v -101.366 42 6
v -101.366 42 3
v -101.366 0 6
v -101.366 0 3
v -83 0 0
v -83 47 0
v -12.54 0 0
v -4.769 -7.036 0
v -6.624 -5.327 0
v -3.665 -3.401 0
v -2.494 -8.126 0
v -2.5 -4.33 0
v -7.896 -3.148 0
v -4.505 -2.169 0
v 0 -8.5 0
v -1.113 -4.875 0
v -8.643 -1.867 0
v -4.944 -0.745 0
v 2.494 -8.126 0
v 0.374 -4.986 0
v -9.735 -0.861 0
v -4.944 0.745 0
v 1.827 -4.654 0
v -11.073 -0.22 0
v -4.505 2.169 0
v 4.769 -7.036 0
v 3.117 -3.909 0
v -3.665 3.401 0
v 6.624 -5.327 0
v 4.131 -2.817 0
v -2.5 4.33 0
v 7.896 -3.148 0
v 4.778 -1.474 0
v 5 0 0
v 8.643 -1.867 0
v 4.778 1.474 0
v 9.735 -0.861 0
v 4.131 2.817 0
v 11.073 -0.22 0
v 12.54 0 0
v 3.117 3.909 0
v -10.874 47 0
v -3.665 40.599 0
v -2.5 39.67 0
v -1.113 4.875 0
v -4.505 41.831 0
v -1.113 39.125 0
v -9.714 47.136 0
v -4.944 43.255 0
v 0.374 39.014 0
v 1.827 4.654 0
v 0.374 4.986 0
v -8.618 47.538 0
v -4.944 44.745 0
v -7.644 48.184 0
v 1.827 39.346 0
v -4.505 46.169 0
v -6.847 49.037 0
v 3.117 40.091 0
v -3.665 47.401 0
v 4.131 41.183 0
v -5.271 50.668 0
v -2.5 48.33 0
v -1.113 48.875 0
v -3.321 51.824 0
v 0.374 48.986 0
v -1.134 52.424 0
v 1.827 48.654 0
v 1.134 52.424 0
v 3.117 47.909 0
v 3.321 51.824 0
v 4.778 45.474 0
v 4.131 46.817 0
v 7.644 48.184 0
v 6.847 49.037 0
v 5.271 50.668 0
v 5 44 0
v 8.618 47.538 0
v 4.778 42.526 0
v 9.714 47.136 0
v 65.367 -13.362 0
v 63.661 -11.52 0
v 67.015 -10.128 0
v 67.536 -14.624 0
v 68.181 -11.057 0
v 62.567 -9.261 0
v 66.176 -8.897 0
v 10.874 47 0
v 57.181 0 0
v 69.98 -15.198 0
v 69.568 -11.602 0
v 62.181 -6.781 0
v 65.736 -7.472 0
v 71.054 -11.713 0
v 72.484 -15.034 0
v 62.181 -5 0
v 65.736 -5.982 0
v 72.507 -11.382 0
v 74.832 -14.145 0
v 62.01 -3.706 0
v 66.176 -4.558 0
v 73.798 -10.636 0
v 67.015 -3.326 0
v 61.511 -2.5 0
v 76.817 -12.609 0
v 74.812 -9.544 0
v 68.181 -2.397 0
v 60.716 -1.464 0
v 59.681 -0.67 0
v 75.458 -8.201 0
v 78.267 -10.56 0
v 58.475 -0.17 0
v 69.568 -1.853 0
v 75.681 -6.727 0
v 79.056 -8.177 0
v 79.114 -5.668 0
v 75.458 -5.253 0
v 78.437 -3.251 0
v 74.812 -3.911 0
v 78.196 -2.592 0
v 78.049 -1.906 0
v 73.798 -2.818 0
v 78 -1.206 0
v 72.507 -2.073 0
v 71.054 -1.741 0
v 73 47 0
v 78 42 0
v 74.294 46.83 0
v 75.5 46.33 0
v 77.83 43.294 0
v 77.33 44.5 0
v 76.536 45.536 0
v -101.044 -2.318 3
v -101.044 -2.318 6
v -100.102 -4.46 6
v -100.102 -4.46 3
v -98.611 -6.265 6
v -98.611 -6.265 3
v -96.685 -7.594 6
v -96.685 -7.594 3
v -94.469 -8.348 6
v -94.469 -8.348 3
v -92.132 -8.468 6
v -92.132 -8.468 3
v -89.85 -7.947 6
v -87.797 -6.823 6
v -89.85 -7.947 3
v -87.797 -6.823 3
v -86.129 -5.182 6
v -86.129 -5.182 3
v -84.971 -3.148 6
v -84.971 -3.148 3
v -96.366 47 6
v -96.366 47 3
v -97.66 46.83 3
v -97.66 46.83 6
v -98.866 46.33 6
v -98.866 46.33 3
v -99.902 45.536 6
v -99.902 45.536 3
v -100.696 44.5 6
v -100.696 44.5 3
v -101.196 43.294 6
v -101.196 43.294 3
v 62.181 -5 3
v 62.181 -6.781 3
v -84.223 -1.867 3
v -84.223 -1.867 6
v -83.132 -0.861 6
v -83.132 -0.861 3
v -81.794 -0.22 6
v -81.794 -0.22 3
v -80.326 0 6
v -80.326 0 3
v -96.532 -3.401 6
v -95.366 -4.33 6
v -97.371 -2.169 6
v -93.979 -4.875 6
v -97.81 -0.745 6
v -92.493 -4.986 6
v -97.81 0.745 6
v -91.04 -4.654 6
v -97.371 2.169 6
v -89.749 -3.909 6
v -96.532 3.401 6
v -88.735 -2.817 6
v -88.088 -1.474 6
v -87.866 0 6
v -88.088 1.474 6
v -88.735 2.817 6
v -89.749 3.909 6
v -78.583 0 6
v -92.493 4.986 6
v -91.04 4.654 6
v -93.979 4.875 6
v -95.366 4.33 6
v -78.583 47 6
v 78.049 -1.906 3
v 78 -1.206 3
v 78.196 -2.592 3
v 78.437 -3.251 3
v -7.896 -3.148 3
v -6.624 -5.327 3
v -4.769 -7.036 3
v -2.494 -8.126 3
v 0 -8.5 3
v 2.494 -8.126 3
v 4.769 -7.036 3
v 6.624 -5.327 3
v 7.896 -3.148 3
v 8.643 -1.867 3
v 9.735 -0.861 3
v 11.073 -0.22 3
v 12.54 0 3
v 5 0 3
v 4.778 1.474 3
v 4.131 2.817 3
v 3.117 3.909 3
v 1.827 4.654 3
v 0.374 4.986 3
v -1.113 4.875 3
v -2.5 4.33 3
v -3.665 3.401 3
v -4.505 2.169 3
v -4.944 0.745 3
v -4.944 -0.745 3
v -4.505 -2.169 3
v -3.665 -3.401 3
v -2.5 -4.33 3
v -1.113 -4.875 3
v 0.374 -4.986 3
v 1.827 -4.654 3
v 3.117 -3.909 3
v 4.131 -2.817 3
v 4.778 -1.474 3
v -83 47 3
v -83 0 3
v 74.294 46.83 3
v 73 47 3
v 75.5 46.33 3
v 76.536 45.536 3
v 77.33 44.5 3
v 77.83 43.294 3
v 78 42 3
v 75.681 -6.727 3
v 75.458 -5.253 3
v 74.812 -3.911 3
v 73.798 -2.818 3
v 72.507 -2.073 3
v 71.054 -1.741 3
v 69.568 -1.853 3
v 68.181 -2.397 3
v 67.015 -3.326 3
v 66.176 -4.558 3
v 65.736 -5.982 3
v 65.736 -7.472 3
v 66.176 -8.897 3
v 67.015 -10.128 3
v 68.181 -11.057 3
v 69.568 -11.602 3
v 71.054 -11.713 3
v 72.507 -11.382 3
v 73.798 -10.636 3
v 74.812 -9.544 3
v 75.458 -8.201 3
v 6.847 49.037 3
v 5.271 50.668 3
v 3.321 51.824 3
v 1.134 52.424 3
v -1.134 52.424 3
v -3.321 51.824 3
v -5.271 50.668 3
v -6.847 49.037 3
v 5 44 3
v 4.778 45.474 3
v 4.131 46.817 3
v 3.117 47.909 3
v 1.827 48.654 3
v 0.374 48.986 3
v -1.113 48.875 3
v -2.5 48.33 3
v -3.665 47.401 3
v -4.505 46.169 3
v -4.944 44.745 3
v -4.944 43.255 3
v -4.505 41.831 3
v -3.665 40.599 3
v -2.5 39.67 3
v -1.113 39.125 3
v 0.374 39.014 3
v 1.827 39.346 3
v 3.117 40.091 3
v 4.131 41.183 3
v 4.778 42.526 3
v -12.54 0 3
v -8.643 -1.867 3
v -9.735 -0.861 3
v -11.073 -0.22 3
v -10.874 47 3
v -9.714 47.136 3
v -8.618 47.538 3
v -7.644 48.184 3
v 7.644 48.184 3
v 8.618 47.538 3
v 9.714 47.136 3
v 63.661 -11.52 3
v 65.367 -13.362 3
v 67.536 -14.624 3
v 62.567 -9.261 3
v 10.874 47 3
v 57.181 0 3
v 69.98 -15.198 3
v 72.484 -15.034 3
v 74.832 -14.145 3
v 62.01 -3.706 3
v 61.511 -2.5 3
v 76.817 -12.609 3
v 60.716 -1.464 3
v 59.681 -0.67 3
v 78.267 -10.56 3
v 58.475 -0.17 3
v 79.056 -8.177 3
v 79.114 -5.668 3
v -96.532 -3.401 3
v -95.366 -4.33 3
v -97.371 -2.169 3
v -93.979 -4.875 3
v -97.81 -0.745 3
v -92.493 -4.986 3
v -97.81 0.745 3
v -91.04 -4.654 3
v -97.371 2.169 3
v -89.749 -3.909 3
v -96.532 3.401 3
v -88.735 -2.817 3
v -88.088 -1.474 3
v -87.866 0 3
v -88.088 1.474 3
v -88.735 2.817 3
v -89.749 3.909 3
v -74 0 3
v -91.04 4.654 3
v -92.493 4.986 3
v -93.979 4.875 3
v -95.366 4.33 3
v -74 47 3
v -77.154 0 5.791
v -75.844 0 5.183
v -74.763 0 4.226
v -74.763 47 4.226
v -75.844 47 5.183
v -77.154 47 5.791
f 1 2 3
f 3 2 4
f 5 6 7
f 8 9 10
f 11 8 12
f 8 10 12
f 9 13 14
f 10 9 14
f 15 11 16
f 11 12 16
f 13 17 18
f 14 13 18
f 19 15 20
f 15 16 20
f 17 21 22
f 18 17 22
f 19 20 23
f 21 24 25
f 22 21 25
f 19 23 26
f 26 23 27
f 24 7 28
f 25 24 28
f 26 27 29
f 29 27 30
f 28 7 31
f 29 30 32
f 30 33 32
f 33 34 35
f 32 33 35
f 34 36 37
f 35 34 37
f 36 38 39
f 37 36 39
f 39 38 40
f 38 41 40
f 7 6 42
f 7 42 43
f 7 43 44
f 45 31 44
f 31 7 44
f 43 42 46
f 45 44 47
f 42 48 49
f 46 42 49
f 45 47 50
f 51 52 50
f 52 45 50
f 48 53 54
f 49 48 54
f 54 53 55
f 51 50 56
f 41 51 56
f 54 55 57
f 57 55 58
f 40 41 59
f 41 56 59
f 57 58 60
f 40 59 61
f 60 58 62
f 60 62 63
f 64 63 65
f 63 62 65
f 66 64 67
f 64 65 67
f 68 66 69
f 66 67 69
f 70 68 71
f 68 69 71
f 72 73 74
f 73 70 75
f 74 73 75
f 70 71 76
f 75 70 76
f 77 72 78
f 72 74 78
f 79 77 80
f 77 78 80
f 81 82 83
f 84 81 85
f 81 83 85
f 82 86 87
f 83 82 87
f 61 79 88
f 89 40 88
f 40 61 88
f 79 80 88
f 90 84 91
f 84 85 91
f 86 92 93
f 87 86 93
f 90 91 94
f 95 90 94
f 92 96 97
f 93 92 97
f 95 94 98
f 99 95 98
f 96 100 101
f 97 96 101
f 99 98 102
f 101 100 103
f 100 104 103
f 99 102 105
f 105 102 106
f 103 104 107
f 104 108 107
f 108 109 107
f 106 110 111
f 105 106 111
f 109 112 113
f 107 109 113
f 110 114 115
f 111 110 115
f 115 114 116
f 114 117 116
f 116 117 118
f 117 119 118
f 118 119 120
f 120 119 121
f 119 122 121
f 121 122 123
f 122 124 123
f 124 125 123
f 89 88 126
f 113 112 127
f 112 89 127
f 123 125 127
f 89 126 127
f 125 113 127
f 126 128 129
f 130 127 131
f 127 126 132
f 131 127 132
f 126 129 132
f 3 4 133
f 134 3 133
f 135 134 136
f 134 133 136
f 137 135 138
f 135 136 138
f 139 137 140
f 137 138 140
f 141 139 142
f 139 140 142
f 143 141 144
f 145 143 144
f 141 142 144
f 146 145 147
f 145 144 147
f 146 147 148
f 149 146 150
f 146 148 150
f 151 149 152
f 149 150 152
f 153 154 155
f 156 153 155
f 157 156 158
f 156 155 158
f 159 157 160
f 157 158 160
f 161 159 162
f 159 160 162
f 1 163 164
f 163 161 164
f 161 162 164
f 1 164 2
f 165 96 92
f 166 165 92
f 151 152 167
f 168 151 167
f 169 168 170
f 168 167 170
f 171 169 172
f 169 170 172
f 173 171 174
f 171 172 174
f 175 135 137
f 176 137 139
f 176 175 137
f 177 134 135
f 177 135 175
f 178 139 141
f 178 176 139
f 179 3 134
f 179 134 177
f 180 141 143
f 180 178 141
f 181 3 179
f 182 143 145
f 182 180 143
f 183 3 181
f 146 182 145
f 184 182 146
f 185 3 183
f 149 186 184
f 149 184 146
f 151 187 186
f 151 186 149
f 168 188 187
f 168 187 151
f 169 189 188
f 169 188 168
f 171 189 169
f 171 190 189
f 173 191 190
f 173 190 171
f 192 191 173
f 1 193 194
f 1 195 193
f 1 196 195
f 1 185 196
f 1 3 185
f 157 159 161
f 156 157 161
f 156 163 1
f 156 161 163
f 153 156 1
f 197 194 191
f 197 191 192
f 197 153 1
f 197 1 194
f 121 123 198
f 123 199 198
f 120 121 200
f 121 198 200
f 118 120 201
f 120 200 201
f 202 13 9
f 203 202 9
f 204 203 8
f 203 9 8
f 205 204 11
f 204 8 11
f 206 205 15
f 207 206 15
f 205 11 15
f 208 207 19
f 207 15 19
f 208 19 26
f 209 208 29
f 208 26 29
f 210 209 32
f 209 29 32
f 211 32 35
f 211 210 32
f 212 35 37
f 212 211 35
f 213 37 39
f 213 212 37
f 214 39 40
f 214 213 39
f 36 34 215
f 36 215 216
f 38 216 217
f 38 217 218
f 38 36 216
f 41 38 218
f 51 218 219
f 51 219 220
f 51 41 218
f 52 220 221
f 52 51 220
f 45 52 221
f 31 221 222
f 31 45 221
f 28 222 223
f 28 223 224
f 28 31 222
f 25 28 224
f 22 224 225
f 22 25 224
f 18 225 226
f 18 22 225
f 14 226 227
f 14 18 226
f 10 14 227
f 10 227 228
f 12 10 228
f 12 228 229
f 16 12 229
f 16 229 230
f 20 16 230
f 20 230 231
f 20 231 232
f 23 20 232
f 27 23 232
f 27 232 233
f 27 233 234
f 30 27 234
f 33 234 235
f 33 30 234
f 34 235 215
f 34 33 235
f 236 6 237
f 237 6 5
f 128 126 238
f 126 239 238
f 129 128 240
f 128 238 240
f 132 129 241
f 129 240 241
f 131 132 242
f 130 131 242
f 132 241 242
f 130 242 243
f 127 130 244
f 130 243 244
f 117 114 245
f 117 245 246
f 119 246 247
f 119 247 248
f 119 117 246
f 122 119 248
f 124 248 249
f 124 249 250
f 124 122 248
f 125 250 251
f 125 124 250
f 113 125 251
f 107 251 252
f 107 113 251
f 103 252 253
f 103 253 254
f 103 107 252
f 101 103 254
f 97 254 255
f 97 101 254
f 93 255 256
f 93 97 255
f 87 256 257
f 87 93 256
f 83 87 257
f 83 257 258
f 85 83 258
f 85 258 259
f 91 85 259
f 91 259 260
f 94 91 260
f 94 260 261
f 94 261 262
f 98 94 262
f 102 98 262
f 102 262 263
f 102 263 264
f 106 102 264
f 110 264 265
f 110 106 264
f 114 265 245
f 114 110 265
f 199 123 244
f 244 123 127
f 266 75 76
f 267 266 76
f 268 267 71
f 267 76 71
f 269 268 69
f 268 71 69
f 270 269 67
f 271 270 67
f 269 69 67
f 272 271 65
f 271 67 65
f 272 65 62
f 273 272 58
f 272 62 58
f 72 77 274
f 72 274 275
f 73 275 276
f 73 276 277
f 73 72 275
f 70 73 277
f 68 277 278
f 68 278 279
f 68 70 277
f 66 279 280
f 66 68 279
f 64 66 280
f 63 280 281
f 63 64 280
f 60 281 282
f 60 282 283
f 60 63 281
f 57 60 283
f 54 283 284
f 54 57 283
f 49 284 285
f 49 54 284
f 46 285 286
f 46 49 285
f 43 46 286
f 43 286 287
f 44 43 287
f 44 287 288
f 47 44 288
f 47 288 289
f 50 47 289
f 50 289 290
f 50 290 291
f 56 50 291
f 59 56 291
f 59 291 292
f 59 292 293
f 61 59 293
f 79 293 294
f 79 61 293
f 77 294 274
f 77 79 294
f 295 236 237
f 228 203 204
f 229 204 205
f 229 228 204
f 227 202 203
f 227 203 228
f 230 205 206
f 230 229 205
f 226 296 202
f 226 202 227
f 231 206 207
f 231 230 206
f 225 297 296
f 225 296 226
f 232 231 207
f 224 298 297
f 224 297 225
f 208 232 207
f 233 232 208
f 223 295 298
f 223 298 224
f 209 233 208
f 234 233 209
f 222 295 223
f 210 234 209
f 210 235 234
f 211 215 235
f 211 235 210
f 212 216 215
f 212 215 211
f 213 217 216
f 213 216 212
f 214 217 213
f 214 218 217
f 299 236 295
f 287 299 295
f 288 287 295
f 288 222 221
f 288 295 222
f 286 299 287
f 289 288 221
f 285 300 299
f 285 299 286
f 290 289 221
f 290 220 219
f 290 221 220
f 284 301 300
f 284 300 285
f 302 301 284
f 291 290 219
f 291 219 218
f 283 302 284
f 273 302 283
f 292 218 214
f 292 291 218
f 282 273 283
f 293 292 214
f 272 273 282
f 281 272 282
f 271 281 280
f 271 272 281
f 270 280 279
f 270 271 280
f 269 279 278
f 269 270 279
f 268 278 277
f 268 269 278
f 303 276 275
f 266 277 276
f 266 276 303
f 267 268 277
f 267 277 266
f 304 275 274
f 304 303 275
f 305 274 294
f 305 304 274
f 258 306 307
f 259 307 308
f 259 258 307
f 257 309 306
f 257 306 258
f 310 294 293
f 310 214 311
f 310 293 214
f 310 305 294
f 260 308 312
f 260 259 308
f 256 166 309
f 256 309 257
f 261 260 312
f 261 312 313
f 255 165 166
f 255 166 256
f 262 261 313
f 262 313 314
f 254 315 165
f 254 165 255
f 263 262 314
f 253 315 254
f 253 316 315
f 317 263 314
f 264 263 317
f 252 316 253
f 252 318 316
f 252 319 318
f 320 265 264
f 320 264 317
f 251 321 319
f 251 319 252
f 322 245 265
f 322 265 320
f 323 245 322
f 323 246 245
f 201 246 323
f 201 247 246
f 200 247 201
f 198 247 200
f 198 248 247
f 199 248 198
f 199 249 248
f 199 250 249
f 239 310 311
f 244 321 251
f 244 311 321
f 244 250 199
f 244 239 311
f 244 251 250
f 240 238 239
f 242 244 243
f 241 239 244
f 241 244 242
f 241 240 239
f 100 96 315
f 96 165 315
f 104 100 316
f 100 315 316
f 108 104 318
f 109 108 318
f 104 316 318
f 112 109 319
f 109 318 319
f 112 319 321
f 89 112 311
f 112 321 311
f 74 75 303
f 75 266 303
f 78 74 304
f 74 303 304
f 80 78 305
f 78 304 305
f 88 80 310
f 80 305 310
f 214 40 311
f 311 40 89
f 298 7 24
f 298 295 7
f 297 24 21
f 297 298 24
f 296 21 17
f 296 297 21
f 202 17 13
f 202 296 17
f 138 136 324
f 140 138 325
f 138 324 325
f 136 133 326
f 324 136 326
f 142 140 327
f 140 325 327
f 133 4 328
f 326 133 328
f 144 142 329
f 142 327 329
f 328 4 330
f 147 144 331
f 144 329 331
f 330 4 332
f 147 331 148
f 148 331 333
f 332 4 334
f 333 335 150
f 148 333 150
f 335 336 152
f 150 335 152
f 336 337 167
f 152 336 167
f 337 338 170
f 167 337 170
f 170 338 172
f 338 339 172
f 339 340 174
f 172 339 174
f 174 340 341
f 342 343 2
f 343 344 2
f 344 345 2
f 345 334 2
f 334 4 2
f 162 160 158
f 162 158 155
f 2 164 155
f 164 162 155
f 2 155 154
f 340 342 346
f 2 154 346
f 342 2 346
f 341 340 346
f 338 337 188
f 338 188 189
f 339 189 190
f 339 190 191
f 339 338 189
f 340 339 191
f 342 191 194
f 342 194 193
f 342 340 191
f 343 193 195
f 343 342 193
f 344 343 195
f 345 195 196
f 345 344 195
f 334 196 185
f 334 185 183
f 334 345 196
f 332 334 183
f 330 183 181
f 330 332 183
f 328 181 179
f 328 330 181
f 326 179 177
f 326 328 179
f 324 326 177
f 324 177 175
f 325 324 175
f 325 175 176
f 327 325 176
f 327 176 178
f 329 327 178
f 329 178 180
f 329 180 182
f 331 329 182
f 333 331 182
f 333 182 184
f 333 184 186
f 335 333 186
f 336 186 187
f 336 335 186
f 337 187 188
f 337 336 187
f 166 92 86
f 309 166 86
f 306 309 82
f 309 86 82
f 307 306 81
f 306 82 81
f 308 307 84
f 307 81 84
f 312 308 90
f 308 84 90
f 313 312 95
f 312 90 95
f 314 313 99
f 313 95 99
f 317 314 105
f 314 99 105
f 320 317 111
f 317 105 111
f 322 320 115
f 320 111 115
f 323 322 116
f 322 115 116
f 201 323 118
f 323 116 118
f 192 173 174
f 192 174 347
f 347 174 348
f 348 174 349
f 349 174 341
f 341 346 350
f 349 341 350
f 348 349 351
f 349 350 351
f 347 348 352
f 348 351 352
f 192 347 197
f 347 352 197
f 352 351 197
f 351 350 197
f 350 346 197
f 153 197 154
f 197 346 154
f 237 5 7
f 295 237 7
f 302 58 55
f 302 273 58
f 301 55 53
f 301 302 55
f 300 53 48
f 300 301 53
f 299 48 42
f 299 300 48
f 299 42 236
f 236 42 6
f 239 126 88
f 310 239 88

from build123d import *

# Parameters (mm, degrees)
F0_R          = 5
F1_DEPTH      = 3
F2_W          = 9
F2_H          = 47
F2_R          = 5
F3_DEPTH      = 3
F4_F1_R       = 5
F4_F2_R       = 5
F4_2_T1_DEPTH = 3
F4_2_T3_DEPTH = 69.9128784748
F4_2_T5_DEPTH = 28


# Not quite as in the source:
# - a fillet or chamfer that OpenCascade refuses, or shapes differently, is made with other operations: its cross-section is extruded or revolved along the edge and cut away or added


with BuildPart() as f1:
    # F0 (on Top) → F1 (new body)
    with BuildSketch(Plane.XY):
        with BuildLine():
            ThreePointArc((7.9529868603, 47), (0, 52.5), (-7.9529868603, 47))
            Line((-7.9529868603, 47), (-83, 47))
            Line((-83, 47), (-83, 0))
            Line((-83, 0), (-8.5, 0))
            ThreePointArc((-8.5, 0), (0, -8.5), (8.5, 0))
            Line((8.5, 0), (62.1807458666, 0))
            Line((62.1807458666, 0), (62.1807458666, -6.6735107167))
            Line((62.1807458666, -6.6735107167), (62.1807458666, -6.7810347379))
            ThreePointArc((62.1807458666, -6.7810347379), (72.9464615235, -14.9196937423), (78, -2.4056954659))
            Line((78, -2.4056954659), (78, 47))
            Line((78, 47), (7.9529868603, 47))
        make_face()
        Circle(F0_R, mode=Mode.SUBTRACT)
        with Locations((70.6805758441, -6.7272727273)):
            Circle(F0_R, mode=Mode.SUBTRACT)
        with Locations((0, 44)):
            Circle(F0_R, mode=Mode.SUBTRACT)
    extrude(amount=F1_DEPTH)

    # F4: fillet of radius 5 on 7 edges, made by hand

    # F4_f1
    f4_f1_edges = [f1.edges().sort_by_distance(p)[0] for p in [
        (8.5, 0, 1.5),
        (-8.5, 0, 1.5),
        (62.1807458666, 0, 1.5),
        (78, -2.4056954659, 1.5),
        (7.9529868603, 47, 1.5),
        (-7.9529868603, 47, 1.5),
    ]]
    fillet(f4_f1_edges, radius=F4_F1_R)

    # F4_f2
    f4_f2_edges = [f1.edges().sort_by_distance(p)[0] for p in [
        (78, 47, 1.5),
    ]]
    fillet(f4_f2_edges, radius=F4_F2_R)


with BuildPart() as f3:
    # F2 (on face) → F3 (new body)
    with BuildSketch(Plane.XY.offset(3)):
        with Locations((-78.5, 23.5)):
            Rectangle(F2_W, F2_H)
        with BuildLine():
            Line((-84.3662815094, 0), (-83, 0))
            Line((-83, 0), (-83, 47))
            Line((-83, 47), (-101.3662815094, 47))
            Line((-101.3662815094, 47), (-101.3662815094, 0))
            ThreePointArc((-101.3662815094, 0), (-92.8662815094, -8.5), (-84.3662815094, 0))
        make_face()
        with Locations((-92.8662815094, 0)):
            Circle(F2_R, mode=Mode.SUBTRACT)
    extrude(amount=F3_DEPTH)

    # F4#2: fillet of radius 5 on 3 edges, made by hand

    # F4_2_s2 → F4_2_t1 (join)
    with BuildSketch(Plane.XY.offset(3)):
        with BuildLine():
            ThreePointArc((-84.9707661217, -3.1481481481), (-83.1317633438, -0.8612043262), (-80.3263453054, 0))
            Line((-80.3263453054, 0), (-84.3662815094, 0))
            ThreePointArc((-84.3662815094, 0), (-84.5187704793, -1.6028286254), (-84.9707661217, -3.1481481481))
        make_face()
    extrude(amount=F4_2_T1_DEPTH)

    # F4_2_s4 → F4_2_t3 (cut)
    with BuildSketch(Plane.XZ.offset(-58.4564392374)):
        with BuildLine():
            ThreePointArc((-74, 3), (-75.8439629074, 5.1833001327), (-78.582575695, 6))
            Line((-78.582575695, 6), (-74, 6))
            Line((-74, 6), (-74, 3))
        make_face()
    extrude(amount=F4_2_T3_DEPTH, mode=Mode.SUBTRACT)

    # F4_2_s6 → F4_2_t5 (cut)
    with BuildSketch(Plane.XY.offset(-9.5)):
        with BuildLine():
            ThreePointArc((-96.3662815094, 47), (-99.9018154153, 45.5355339059), (-101.3662815094, 42))
            Line((-101.3662815094, 42), (-101.3662815094, 47))
            Line((-101.3662815094, 47), (-96.3662815094, 47))
        make_face()
    extrude(amount=F4_2_T5_DEPTH, mode=Mode.SUBTRACT)


solid = Compound([f1.part, f3.part])
